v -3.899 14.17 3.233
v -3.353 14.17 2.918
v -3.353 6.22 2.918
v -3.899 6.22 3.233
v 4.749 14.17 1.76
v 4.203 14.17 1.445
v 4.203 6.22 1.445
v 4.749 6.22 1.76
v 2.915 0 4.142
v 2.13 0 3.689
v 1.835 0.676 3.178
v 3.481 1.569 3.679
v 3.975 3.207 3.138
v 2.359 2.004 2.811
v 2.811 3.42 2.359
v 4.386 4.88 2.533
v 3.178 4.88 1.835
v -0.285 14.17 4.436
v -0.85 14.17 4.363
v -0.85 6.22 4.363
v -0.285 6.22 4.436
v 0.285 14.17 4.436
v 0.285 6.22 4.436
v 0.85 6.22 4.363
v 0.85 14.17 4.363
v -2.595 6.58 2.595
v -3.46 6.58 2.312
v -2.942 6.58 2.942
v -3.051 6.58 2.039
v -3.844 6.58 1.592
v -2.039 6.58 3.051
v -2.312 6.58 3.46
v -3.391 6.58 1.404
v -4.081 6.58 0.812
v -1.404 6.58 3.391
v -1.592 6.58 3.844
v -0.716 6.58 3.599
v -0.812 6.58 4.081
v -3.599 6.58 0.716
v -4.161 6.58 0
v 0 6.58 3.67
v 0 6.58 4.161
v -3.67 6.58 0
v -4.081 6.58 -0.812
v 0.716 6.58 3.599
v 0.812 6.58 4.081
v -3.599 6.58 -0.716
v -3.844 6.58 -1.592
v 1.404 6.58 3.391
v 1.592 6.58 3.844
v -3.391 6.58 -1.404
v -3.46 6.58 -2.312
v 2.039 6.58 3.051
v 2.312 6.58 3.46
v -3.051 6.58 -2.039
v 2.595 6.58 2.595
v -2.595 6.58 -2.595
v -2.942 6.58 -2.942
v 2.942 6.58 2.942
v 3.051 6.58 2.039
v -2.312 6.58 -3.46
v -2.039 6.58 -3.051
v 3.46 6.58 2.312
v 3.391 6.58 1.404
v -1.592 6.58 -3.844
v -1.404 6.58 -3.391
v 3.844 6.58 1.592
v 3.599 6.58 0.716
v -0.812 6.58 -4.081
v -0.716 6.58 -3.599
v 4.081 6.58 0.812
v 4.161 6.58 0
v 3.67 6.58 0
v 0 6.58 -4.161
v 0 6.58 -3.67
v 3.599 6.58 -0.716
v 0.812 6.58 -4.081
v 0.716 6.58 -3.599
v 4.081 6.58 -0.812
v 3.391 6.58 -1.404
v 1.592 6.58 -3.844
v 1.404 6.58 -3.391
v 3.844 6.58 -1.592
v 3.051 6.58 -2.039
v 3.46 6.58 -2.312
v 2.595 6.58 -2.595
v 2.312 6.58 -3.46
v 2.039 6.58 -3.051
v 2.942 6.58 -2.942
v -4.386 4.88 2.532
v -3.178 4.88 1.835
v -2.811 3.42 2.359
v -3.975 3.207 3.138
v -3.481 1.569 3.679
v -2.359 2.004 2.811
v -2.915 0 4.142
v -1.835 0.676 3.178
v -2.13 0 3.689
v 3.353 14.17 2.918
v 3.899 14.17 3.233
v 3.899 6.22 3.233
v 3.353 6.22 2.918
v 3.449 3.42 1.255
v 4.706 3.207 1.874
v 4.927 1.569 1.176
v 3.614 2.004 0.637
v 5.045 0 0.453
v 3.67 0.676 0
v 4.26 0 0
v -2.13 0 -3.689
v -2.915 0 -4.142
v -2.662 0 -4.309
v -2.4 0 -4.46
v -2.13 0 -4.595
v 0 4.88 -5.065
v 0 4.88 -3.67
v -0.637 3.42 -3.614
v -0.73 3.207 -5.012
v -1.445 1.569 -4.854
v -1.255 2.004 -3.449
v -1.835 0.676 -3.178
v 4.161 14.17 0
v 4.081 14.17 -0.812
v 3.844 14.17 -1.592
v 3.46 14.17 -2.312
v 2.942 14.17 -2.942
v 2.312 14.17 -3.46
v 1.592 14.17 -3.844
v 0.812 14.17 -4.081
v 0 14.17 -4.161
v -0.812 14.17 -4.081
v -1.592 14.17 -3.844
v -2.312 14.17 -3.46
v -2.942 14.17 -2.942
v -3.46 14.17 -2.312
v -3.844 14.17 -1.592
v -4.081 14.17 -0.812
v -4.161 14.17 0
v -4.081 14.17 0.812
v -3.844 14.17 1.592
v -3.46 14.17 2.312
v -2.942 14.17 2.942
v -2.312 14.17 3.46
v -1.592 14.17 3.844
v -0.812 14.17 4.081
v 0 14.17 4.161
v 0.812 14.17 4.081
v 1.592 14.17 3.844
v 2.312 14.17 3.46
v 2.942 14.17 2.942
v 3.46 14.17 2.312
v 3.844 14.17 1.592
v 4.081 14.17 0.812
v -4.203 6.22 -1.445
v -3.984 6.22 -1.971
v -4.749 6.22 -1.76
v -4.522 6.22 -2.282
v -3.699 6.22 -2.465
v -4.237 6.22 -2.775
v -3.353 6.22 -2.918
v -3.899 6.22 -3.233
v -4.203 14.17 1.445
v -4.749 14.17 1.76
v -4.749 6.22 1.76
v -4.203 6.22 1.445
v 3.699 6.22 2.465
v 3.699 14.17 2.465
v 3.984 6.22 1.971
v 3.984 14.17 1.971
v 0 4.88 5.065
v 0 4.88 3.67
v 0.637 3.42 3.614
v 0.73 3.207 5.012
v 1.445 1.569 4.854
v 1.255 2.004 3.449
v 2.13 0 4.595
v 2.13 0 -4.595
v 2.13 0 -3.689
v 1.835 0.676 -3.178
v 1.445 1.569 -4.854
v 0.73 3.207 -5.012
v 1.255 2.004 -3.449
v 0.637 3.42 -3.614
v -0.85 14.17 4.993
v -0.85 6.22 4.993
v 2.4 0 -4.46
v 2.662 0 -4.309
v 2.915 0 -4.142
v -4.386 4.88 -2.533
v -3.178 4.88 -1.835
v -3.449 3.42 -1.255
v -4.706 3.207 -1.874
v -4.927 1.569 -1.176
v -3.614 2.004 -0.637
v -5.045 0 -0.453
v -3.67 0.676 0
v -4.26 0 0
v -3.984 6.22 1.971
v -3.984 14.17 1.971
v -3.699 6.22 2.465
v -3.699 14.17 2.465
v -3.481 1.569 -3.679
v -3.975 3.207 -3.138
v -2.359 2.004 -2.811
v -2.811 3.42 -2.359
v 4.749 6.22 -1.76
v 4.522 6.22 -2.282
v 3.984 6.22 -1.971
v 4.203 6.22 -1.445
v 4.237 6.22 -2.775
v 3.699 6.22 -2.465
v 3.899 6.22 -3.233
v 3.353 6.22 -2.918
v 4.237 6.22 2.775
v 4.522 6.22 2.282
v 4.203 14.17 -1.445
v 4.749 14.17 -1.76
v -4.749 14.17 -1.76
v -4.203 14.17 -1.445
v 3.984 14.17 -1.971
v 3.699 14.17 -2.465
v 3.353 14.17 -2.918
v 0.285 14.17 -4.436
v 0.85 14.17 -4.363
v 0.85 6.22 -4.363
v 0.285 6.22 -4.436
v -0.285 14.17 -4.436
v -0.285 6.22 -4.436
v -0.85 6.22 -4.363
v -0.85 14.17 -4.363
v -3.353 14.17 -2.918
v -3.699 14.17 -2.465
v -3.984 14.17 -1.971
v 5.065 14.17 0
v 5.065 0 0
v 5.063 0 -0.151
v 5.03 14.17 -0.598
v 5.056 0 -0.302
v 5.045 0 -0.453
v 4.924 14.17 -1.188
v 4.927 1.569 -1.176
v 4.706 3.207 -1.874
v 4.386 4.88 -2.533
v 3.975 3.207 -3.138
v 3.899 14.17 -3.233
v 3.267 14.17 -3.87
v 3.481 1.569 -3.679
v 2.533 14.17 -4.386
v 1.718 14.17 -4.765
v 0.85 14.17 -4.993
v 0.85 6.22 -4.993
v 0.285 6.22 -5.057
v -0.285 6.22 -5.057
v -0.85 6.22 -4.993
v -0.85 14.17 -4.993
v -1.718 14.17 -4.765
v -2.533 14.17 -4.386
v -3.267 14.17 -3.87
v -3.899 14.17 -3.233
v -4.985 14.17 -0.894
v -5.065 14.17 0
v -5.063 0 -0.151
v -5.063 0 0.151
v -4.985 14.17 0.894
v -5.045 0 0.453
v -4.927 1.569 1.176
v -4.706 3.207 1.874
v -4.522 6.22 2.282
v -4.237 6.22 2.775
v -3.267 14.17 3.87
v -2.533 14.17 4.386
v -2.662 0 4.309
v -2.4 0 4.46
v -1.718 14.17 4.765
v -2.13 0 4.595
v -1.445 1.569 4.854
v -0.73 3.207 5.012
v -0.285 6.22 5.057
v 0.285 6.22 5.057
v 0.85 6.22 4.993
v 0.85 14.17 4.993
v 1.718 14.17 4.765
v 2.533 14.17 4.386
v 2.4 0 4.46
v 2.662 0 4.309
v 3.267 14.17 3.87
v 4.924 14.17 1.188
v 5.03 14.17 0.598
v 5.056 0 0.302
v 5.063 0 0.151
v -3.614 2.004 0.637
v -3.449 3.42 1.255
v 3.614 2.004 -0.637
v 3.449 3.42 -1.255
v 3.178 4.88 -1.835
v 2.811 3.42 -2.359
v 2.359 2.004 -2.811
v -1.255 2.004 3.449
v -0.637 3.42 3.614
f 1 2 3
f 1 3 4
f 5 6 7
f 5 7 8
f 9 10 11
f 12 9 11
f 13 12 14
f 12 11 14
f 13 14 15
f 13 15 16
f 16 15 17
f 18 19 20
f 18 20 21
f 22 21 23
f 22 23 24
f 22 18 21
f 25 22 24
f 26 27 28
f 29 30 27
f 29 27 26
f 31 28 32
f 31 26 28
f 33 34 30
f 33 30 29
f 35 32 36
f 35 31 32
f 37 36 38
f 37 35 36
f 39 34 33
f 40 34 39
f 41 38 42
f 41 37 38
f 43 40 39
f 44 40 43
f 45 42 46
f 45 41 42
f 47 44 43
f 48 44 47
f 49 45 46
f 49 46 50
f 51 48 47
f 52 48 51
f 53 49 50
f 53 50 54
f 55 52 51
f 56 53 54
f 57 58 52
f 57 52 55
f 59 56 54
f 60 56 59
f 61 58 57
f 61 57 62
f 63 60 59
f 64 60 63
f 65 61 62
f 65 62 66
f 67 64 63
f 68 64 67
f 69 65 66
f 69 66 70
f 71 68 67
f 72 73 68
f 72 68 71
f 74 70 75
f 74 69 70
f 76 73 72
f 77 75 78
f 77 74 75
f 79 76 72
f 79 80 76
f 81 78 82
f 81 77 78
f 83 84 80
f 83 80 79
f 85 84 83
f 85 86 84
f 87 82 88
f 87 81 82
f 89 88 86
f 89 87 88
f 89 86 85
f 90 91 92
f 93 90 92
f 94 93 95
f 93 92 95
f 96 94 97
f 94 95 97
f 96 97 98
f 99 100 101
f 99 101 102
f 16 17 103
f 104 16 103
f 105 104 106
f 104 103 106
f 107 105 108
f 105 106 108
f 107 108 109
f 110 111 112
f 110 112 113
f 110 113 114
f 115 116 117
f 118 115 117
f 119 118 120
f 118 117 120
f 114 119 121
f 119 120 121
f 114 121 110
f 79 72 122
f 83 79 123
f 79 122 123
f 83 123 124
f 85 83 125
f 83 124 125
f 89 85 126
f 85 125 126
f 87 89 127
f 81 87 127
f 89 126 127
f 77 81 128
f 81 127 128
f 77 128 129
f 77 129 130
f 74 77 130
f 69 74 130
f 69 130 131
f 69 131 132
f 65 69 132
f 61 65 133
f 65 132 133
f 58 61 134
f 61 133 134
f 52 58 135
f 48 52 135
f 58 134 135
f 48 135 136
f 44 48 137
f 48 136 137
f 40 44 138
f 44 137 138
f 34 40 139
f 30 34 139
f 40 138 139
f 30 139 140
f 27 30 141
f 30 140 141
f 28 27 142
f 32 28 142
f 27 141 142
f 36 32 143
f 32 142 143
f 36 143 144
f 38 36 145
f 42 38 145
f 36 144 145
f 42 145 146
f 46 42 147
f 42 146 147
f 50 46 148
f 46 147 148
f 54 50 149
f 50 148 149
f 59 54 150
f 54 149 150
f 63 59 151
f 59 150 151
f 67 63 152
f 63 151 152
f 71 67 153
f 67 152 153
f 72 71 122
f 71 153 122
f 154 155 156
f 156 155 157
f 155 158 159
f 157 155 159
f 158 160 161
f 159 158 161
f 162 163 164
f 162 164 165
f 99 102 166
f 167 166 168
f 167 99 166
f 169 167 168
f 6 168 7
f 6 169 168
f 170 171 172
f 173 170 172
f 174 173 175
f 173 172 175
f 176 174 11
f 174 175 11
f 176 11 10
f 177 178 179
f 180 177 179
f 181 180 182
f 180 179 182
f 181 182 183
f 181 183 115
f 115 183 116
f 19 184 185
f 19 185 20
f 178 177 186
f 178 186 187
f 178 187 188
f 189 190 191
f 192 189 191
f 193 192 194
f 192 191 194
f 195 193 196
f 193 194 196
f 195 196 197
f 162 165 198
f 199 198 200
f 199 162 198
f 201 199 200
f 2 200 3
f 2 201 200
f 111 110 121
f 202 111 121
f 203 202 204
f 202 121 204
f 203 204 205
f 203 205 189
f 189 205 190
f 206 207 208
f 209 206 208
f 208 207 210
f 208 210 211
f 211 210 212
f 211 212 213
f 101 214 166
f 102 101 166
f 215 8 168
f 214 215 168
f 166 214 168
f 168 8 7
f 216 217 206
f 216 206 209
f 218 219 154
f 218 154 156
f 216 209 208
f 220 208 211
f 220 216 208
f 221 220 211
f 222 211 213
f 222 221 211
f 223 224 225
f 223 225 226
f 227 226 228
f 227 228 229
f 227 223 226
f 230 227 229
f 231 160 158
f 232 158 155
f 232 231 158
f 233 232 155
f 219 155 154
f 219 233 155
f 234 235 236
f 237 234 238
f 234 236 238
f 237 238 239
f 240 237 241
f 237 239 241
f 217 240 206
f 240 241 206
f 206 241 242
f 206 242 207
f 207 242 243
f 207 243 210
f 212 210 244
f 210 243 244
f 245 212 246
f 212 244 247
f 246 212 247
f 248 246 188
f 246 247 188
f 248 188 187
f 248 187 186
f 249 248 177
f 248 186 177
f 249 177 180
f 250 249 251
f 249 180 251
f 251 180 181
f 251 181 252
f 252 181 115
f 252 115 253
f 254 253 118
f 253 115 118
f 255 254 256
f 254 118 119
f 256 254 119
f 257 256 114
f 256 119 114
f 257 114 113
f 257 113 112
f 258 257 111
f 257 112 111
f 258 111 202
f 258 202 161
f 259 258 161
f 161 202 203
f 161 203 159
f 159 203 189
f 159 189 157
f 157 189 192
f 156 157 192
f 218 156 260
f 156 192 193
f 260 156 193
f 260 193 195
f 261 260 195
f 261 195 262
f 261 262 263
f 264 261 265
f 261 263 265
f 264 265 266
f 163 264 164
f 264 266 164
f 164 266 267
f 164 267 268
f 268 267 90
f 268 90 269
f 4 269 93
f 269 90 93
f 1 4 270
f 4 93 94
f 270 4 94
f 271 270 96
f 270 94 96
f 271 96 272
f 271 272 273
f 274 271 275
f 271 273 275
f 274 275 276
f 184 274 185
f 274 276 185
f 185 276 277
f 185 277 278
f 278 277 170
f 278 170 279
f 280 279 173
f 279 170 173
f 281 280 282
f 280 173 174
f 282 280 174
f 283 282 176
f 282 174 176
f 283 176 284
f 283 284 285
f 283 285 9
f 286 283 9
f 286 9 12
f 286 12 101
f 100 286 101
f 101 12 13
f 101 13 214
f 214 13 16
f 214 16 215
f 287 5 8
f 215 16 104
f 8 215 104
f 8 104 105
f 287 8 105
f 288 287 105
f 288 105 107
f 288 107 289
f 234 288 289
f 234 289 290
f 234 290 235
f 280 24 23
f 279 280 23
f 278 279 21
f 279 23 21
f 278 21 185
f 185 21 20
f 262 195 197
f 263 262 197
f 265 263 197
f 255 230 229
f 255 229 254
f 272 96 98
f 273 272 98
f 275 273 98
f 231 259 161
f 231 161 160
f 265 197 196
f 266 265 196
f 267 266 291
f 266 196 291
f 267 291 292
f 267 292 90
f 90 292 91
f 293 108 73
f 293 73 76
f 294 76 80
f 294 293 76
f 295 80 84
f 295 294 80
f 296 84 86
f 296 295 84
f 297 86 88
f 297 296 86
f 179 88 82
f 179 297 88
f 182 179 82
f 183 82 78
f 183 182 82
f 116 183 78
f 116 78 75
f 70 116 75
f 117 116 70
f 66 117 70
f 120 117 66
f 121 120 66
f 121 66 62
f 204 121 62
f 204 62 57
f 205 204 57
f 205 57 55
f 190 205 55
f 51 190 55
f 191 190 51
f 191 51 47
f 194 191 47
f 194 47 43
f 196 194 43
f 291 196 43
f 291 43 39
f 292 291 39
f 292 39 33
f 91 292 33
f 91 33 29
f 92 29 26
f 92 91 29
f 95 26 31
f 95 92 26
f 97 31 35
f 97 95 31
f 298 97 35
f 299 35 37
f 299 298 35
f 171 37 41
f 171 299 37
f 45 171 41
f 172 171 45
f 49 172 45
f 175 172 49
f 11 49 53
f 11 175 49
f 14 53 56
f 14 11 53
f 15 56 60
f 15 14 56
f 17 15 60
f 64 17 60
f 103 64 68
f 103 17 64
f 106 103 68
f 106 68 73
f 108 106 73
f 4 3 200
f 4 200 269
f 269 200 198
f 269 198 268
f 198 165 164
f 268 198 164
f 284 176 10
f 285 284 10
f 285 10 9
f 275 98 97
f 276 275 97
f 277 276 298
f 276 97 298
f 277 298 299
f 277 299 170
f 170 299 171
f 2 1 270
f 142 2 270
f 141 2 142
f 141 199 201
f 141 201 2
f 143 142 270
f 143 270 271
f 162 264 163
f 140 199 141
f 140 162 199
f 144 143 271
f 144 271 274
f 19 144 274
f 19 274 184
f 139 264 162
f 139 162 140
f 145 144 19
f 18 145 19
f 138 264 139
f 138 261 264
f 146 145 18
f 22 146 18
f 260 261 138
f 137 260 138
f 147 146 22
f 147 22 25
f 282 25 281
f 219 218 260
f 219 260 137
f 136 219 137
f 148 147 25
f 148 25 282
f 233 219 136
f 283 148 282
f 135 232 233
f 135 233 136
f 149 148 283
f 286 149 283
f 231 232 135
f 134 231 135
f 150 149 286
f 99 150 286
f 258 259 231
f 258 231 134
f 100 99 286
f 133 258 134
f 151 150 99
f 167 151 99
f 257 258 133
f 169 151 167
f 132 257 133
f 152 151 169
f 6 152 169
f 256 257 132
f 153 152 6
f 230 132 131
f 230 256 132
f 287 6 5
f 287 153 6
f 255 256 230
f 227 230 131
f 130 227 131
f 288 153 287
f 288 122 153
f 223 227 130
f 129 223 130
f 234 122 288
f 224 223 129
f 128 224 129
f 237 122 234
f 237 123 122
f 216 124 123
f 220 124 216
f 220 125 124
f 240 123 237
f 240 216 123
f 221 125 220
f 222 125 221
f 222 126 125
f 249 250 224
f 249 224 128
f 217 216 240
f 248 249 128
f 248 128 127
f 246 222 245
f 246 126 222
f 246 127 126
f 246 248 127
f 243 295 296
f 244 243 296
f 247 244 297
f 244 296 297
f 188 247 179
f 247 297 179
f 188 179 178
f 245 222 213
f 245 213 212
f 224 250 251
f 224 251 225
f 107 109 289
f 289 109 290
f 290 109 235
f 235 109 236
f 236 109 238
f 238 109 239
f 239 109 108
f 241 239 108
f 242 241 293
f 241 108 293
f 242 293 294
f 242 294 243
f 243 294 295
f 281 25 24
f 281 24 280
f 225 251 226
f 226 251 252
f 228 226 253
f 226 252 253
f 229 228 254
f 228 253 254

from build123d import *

# Parameters (mm, degrees)
SKETCH1_R           = 5.065
SKETCH1_R_2         = 3.67
BOSS_EXTRUDE1_DEPTH = 14.17
CUT_EXTRUDE1_DEPTH  = 7.95
SKETCH3_R           = 4.160986794
CUT_EXTRUDE2_DEPTH  = 7.59
CUT_EXTRUDE4_DEPTH  = 5.065
CIRPATTERN2_COUNT   = 6


with BuildPart() as part:
    # Sketch1 → Boss-Extrude1 (new body)
    with BuildSketch(Plane(origin=(0, 0, 0), x_dir=(1, 0, 0), z_dir=(0, 1, 0))):
        Circle(SKETCH1_R)
        Circle(SKETCH1_R_2, mode=Mode.SUBTRACT)
    extrude(amount=BOSS_EXTRUDE1_DEPTH)

    # Sketch2 → Cut-Extrude1 (cut)
    with BuildSketch(Plane(origin=(0, 14.17, 0), x_dir=(1, 0, 0), z_dir=(0, 1, 0))):
        with BuildLine():
            Line((-0.85, 4.362972037), (-0.85, 4.993167832))
            ThreePointArc((-0.85, 4.993167832), (0, 5.065), (0.85, 4.993167832))
            Line((0.85, 4.993167832), (0.85, 4.362972037))
            ThreePointArc((0.85, 4.362972037), (0, 4.445), (-0.85, 4.362972037))
        make_face()
        with BuildLine():
            Line((3.35344462, 2.917607612), (3.899210188, 3.232705509))
            ThreePointArc((3.899210188, 3.232705509), (4.38641867, 2.5325), (4.749210188, 1.760462323))
            Line((4.749210188, 1.760462323), (4.20344462, 1.445364426))
            ThreePointArc((4.20344462, 1.445364426), (3.84948292, 2.2225), (3.35344462, 2.917607612))
        make_face()
        with BuildLine():
            Line((4.20344462, -1.445364426), (4.749210188, -1.760462323))
            ThreePointArc((4.749210188, -1.760462323), (4.38641867, -2.5325), (3.899210188, -3.232705509))
            Line((3.899210188, -3.232705509), (3.35344462, -2.917607612))
            ThreePointArc((3.35344462, -2.917607612), (3.84948292, -2.2225), (4.20344462, -1.445364426))
        make_face()
        with BuildLine():
            Line((0.85, -4.362972037), (0.85, -4.993167832))
            ThreePointArc((0.85, -4.993167832), (0, -5.065), (-0.85, -4.993167832))
            Line((-0.85, -4.993167832), (-0.85, -4.362972037))
            ThreePointArc((-0.85, -4.362972037), (0, -4.445), (0.85, -4.362972037))
        make_face()
        with BuildLine():
            Line((-3.35344462, -2.917607612), (-3.899210188, -3.232705509))
            ThreePointArc((-3.899210188, -3.232705509), (-4.38641867, -2.5325), (-4.749210188, -1.760462323))
            Line((-4.749210188, -1.760462323), (-4.20344462, -1.445364426))
            ThreePointArc((-4.20344462, -1.445364426), (-3.84948292, -2.2225), (-3.35344462, -2.917607612))
        make_face()
        with BuildLine():
            Line((-4.20344462, 1.445364426), (-4.749210188, 1.760462323))
            ThreePointArc((-4.749210188, 1.760462323), (-4.38641867, 2.5325), (-3.899210188, 3.232705509))
            Line((-3.899210188, 3.232705509), (-3.35344462, 2.917607612))
            ThreePointArc((-3.35344462, 2.917607612), (-3.84948292, 2.2225), (-4.20344462, 1.445364426))
        make_face()
    extrude(amount=-CUT_EXTRUDE1_DEPTH, mode=Mode.SUBTRACT)

    # Sketch3 → Cut-Extrude2 (cut)
    with BuildSketch(Plane(origin=(0, 14.17, 0), x_dir=(1, 0, 0), z_dir=(0, 1, 0))):
        Circle(SKETCH3_R)
    extrude(amount=-CUT_EXTRUDE2_DEPTH, mode=Mode.SUBTRACT)

    # Sketch5 → Cut-Extrude4 (cut)
    with BuildSketch(Plane.XY):
        Polygon((0, 4.88), (-2.13, 0), (2.13, 0), align=None)
    cut_extrude4 = extrude(amount=-CUT_EXTRUDE4_DEPTH, mode=Mode.SUBTRACT)

    # CirPattern2: Cut-Extrude4 ×6 about axis
    cirpattern2_axis = Axis((0, 0, 0), (0, 1, 0))
    for i in range(1, CIRPATTERN2_COUNT):
        add(cut_extrude4.rotate(cirpattern2_axis, i * 360 / CIRPATTERN2_COUNT), mode=Mode.SUBTRACT)


solid = part.part
